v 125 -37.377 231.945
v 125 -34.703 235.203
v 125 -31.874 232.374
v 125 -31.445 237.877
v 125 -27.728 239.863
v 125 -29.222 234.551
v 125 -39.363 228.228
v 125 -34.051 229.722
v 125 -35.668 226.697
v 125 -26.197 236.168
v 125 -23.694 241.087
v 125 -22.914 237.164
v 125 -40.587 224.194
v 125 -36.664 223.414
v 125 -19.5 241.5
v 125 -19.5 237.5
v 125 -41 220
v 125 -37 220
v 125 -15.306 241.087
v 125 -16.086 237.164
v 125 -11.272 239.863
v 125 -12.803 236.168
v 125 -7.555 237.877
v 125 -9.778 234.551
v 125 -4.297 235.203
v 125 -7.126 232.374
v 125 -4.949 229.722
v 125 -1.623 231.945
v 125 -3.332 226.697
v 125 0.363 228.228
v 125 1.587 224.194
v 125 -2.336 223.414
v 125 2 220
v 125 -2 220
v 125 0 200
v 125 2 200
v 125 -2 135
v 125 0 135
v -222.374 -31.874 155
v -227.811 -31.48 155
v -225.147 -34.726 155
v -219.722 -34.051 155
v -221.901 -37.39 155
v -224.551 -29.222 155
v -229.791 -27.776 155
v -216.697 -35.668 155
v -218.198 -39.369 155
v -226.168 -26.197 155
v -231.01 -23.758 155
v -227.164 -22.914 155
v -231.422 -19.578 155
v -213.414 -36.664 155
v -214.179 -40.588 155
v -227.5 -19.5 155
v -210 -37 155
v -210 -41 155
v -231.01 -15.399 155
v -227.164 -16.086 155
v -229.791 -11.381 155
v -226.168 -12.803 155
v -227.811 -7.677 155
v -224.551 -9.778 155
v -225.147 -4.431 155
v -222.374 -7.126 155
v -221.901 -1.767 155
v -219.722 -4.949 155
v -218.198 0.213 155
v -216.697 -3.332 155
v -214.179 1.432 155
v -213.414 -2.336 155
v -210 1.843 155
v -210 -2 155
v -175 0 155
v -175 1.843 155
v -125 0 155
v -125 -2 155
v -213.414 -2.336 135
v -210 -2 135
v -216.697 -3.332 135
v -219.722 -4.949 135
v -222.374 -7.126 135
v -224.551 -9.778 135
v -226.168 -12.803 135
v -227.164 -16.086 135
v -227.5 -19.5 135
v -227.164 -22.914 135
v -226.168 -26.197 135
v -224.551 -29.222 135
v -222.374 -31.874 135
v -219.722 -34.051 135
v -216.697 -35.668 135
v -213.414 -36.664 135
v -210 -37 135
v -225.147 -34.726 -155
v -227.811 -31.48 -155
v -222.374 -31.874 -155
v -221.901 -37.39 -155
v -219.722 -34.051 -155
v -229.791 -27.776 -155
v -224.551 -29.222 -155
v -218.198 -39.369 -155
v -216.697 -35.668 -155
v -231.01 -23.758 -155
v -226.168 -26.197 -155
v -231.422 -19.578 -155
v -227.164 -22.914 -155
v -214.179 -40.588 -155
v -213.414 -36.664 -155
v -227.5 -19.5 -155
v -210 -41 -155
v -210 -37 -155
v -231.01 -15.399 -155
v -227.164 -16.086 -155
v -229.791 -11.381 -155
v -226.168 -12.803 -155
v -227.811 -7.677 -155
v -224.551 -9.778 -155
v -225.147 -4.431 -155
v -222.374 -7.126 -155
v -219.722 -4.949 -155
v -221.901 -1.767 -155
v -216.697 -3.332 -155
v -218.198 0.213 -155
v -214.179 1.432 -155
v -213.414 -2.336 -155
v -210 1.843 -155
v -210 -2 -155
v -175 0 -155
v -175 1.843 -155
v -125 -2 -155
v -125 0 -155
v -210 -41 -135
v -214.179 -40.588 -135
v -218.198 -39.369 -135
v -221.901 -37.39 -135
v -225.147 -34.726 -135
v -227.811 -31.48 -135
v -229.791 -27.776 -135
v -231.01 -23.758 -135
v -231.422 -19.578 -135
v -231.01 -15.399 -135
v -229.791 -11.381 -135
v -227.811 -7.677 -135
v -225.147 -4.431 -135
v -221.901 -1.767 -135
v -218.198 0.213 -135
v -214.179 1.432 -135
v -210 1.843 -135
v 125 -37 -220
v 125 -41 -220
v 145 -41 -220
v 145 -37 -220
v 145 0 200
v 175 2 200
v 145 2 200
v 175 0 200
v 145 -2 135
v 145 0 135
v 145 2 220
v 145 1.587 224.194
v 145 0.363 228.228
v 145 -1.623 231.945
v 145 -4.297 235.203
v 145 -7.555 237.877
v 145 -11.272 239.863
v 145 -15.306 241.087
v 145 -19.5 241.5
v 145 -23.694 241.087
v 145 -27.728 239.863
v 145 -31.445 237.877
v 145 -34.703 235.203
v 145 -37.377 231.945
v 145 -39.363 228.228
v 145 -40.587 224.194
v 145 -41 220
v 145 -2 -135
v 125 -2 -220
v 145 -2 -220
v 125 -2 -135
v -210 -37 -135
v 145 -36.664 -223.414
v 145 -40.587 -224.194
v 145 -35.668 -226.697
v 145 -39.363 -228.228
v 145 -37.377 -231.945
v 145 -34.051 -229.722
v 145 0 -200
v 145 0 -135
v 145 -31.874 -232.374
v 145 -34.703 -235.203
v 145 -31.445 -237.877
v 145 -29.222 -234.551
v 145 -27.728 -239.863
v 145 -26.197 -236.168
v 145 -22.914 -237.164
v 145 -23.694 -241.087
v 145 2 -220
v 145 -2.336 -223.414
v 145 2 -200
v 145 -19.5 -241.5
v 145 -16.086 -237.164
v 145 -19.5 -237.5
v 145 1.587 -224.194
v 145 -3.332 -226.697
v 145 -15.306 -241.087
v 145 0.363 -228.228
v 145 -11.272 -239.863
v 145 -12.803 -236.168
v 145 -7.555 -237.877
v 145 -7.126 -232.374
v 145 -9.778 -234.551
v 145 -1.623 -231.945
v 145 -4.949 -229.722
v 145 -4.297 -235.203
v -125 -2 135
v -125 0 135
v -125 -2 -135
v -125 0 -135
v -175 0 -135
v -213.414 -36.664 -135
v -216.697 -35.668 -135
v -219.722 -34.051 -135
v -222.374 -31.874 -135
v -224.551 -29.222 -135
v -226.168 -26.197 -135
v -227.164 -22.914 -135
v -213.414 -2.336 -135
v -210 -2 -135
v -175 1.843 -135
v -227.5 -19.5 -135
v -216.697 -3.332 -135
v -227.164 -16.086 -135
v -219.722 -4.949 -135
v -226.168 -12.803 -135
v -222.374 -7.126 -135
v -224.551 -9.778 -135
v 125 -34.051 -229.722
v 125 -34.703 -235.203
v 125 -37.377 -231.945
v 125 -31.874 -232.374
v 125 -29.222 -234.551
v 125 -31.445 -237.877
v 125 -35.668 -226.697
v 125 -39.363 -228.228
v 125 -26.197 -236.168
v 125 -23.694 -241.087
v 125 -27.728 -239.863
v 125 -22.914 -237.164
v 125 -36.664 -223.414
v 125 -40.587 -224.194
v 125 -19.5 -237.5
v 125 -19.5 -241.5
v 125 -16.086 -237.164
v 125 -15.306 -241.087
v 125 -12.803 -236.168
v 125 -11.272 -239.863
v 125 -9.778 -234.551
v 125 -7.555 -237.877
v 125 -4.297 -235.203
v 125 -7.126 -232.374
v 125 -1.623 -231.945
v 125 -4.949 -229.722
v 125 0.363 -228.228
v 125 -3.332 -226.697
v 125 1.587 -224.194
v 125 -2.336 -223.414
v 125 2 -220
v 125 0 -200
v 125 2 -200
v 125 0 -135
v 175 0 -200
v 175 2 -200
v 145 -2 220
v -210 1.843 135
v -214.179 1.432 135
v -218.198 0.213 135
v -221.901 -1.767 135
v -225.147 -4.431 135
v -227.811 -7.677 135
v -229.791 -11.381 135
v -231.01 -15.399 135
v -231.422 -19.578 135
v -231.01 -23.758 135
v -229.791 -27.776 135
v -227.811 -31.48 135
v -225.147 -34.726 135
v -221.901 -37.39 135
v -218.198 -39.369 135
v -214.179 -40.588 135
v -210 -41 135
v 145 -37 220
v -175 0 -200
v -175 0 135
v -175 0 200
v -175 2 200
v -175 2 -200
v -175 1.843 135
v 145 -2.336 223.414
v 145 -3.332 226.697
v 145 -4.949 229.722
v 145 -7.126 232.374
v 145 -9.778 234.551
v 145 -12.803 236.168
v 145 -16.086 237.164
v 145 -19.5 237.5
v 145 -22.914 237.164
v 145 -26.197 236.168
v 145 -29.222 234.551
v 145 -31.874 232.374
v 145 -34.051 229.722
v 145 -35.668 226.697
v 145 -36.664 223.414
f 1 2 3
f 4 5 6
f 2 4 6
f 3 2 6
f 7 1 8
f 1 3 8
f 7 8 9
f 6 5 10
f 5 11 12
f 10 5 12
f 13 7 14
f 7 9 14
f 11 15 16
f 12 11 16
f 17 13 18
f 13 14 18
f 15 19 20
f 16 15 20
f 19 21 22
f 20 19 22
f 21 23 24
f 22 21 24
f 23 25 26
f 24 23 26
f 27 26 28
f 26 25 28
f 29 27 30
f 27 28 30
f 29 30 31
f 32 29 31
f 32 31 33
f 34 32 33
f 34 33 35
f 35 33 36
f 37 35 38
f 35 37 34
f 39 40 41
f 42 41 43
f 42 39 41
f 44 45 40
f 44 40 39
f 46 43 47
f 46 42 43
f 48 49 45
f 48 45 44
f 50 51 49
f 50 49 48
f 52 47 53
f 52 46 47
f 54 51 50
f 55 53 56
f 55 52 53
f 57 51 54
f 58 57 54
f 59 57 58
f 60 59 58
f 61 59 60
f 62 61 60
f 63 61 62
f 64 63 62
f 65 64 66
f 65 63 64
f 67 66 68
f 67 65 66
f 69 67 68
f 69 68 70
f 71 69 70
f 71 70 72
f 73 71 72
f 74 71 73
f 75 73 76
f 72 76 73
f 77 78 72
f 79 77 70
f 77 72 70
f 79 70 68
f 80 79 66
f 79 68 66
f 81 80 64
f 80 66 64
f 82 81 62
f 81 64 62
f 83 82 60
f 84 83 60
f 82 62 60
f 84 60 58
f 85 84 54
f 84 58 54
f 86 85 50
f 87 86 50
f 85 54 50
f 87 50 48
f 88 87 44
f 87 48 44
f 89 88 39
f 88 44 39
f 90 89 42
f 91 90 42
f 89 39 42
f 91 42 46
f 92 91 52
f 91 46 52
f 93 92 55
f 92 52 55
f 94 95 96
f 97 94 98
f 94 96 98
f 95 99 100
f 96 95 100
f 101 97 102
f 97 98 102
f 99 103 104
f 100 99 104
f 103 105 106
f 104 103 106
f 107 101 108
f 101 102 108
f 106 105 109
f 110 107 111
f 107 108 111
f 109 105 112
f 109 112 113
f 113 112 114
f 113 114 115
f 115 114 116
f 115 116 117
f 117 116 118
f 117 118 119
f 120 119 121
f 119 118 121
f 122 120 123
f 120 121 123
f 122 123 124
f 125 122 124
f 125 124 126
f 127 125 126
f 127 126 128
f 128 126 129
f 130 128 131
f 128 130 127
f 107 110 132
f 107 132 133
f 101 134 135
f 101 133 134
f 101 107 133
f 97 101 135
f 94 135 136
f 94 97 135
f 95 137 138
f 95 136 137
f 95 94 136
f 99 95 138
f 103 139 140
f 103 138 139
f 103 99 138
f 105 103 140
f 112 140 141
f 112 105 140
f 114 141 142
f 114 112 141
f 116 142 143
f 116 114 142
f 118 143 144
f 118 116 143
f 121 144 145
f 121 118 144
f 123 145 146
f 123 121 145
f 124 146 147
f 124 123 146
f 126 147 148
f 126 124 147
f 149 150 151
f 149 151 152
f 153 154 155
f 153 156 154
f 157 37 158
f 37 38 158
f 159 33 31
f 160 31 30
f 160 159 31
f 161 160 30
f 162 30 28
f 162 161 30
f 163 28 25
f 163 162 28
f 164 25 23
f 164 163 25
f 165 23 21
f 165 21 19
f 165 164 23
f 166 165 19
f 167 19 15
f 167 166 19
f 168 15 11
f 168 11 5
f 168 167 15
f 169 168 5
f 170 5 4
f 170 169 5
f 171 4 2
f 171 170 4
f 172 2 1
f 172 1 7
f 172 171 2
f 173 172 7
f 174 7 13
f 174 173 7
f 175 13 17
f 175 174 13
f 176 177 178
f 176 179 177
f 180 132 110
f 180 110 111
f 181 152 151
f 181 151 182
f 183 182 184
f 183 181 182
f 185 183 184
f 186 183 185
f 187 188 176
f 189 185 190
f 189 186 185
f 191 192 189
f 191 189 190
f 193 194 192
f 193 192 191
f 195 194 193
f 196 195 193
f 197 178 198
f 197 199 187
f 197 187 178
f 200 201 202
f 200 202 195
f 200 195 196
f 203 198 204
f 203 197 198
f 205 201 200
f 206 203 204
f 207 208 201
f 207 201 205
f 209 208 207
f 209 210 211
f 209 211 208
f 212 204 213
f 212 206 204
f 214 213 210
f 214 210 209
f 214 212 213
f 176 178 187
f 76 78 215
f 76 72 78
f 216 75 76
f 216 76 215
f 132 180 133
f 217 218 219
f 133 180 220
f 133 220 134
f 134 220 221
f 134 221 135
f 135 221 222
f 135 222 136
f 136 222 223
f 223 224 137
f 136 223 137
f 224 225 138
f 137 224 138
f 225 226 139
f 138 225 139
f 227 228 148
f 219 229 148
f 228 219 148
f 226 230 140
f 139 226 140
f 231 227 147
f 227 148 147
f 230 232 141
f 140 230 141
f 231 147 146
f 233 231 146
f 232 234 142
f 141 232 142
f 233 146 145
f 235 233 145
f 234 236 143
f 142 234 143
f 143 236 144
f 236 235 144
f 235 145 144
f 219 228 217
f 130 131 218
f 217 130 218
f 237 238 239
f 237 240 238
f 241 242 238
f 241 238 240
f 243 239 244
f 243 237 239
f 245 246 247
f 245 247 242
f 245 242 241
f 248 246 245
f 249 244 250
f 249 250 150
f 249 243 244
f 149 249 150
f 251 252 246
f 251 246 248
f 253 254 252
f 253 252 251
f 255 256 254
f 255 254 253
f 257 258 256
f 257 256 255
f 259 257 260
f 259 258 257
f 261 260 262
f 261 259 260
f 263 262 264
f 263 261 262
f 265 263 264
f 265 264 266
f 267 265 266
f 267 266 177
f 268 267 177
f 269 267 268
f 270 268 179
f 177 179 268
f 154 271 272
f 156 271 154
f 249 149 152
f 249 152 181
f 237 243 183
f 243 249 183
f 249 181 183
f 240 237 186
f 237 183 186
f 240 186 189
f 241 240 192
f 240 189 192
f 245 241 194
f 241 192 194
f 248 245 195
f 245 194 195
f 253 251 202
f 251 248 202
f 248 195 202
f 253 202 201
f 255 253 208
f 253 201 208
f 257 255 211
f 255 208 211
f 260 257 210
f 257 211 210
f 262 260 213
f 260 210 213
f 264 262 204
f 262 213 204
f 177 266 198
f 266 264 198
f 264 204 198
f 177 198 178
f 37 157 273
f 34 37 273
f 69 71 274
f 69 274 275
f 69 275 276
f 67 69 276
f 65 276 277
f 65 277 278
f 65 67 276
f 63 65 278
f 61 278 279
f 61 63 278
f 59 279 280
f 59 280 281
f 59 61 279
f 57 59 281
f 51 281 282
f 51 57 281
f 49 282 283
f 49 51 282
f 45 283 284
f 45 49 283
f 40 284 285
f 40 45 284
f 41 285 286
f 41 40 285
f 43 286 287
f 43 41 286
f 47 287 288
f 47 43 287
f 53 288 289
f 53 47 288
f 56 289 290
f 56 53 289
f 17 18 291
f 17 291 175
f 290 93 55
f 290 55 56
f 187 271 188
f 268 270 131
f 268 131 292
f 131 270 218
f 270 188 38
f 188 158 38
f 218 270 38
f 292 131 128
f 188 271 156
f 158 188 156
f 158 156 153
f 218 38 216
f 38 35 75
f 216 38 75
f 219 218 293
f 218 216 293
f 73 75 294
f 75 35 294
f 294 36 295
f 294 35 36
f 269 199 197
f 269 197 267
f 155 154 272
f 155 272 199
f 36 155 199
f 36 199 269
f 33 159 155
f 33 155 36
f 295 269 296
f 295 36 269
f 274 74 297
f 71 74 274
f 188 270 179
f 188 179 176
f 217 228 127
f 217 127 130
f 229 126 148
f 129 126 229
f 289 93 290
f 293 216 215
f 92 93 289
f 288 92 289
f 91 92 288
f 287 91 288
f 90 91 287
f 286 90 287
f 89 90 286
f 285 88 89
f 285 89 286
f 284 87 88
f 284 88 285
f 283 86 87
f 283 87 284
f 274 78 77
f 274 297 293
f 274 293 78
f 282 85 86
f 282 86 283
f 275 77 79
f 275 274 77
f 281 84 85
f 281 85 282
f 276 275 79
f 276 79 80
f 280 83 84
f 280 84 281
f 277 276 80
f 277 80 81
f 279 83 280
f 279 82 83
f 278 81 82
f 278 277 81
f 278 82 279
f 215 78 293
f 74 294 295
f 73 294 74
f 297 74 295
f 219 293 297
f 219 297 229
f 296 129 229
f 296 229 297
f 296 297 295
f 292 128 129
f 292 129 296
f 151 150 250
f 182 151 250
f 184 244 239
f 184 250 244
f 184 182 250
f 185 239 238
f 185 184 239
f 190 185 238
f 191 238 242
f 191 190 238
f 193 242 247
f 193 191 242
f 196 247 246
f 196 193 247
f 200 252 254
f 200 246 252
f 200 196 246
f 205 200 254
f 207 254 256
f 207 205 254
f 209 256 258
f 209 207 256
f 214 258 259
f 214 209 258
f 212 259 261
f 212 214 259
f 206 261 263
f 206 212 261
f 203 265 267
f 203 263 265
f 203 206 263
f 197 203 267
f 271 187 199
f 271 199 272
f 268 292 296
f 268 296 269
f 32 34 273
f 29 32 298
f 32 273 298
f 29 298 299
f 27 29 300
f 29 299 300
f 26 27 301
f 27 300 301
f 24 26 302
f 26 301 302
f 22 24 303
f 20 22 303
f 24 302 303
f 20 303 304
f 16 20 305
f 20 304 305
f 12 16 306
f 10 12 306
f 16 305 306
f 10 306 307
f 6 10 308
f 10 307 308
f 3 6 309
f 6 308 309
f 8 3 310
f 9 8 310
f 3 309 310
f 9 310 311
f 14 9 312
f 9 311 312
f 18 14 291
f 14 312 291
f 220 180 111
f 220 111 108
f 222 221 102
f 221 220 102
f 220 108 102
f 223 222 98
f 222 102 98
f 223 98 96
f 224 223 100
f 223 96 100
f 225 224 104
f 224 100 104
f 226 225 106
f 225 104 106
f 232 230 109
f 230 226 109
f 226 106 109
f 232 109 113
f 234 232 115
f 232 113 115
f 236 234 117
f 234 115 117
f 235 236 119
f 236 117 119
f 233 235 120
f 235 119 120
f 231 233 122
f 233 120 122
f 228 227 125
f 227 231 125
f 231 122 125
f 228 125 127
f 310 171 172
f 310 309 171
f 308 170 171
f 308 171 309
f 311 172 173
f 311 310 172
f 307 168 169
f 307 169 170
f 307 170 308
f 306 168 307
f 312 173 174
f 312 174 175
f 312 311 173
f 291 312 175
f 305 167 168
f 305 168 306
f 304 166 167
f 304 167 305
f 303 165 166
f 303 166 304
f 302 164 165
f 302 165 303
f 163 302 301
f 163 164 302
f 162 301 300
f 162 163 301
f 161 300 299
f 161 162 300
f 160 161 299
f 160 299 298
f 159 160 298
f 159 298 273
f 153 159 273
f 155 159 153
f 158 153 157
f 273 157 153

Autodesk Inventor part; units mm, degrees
ref_plane "YZ Plane" through (0, 0, 0) normal (1, 0, 0) x (0, 1, 0)
ref_plane "XZ Plane" through (0, 0, 0) normal (0, 1, 0) x (-1, 0, 0)
ref_plane "XY Plane" through (0, 0, 0) normal (0, 0, 1) x (1, 0, 0)
sketch "Sketch1" plane through (0, 0, 0) normal (0, 1, 0) x (-1, 0, 0)
  line L0 (-175, 200) -> (175, 200)
  line L1 (175, 200) -> (175, -200)
  line L2 (175, -200) -> (-175, -200)
  line L3 (-175, -200) -> (-175, 200)
  line L4 (-175, 200) -> (175, -200) construction
  line L5 (175, 200) -> (-175, -200) construction
  point P0 (0, 0)
  point P1 (0, 0)
  dimension "d0" = 350
  dimension "d1" = 400
extrude "Extrusion1" add sketch "Sketch1" along normal blind 2
sketch "Sketch2" plane through (0, 0, 0) normal (0, -1, 0) x (1, 0, 0)
  line L0 (175, 200) -> (175, -200) construction
  line L1 (-175, 200) -> (175, 200) construction
  line L2 (175, 155) -> (125, 155)
  line L3 (125, 155) -> (125, 135)
  line L4 (125, 135) -> (175, 135)
  line L5 (175, 135) -> (175, 155)
  line L6 (0, 0) -> (119.5058, 0) construction
  line L7 (175, -155) -> (125, -155)
  line L8 (125, -155) -> (125, -135)
  line L9 (125, -135) -> (175, -135)
  line L10 (175, -135) -> (175, -155)
  line L11 (175, -200) -> (-175, -200) construction
  line L12 (0, 0) -> (0, 102.1582) construction
  line L13 (-175, 155) -> (-125, 155)
  line L14 (-125, 155) -> (-125, 135)
  line L15 (-125, 135) -> (-175, 135)
  line L16 (-175, 135) -> (-175, 155)
  line L17 (-175, -155) -> (-125, -155)
  line L18 (-125, -155) -> (-125, -135)
  line L19 (-125, -135) -> (-175, -135)
  line L20 (-175, -135) -> (-175, -155)
  line L21 (125, 135) -> (145, 135)
  line L22 (145, 135) -> (145, 200)
  line L23 (145, 200) -> (125, 200)
  line L24 (125, 200) -> (125, 135)
  line L25 (125, -135) -> (145, -135)
  line L26 (145, -135) -> (145, -200)
  line L27 (145, -200) -> (125, -200)
  line L28 (125, -200) -> (125, -135)
  point P0 (150, 155)
  point P1 (150, -155)
  point P2 (-150, 155)
  point P3 (-150, -155)
  dimension "d4" = 50
  dimension "d5" = 20
  dimension "d6" = 45
  dimension "d9" = 20
  dimension "d10" = 20
extrude "Extrusion2" add sketch "Sketch2" along normal blind 2 contours L22 L4 L3 L2 | L2 L24 L23 L22 | L26 L27 L28 L7 | L7 L8 L9 L26 | L13 L14 L15 L16 | L20 L19 L18 L17
sketch "Sketch3" plane through (145, 0, 200) normal (1, 0, 0) x (0, 0, -1)
  line L0 (400, 2) -> (0, 2) construction
  line L1 (0, 2) -> (-20, 2)
  line L2 (0, -2) -> (-20, -2)
  line L3 (-20, -2) -> (-20, 2)
  arc A0 (-20, -2) -> (-20, -37) centre (-20, -19.5) ccw
  line L4 (-20, -2) -> (-20, -37) construction
  line L5 (-20, -2) -> (15, -2) construction
  arc A1 (-20, 2) -> (-20, -41) centre (-20, -19.5) ccw
  line L6 (-20, 2) -> (-20, -44.4597)
  line L7 (0, 2) -> (0, -2)
  point P0 (200, 0)
  point P1 (-20, -41)
  point P2 (-20, -37)
  dimension "d11" = 20
  dimension "d12" = 35
  dimension "d13" = 90
  dimension "d14" = 4
extrude "Extrusion3" add sketch "Sketch3" against normal up to surface (20 mm away) contours L7 L2 L3 L1 | L3 A0 L6 A1
mirror "Mirror1" about plane through (0, 0, 0) normal (0, 0, 1) of "Extrusion3"
sketch "Sketch4" plane through (-175, 0, 155) normal (0, 0, 1) x (1, 0, 0)
  line L0 (139.9111, 57.1289) -> (-260.0889, 57.1289) construction
  line L1 (0, 1.8433) -> (-35, 1.8433)
  line L2 (0, -2) -> (-35, -2)
  line L3 (-35, -2) -> (-35, 1.8433)
  arc A0 (-35, -2) -> (-35, -37) centre (-35, -19.5) ccw
  line L4 (-35, -2) -> (-35, -37) construction
  line L5 (-280.0889, 53.1289) -> (-245.0889, 53.1289) construction
  arc A1 (-35, 1.8433) -> (-35, -41) centre (-35, -19.5784) ccw
  line L6 (-35, 1.8433) -> (-35, -44.4597)
  line L7 (0, 1.8433) -> (0, -2)
  point P0 (175, 0)
  point P1 (-60.0889, 55.1289)
  point P2 (-280.0889, 14.1289)
  point P3 (-280.0889, 18.1289)
  point P4 (-35, -37)
  point P5 (-35, -2)
  point P6 (-35, -2)
  dimension "d17" = 35
  dimension "d18" = 35
  dimension "d19" = 90
  dimension "d20" = 4
extrude "Extrusion4" add sketch "Sketch4" against normal up to surface (20 mm away) contours L7 L2 L3 L1 | L3 A0 L6 A1
mirror "Mirror2" about plane through (0, 0, 0) normal (0, 0, 1) of "Extrusion4"
